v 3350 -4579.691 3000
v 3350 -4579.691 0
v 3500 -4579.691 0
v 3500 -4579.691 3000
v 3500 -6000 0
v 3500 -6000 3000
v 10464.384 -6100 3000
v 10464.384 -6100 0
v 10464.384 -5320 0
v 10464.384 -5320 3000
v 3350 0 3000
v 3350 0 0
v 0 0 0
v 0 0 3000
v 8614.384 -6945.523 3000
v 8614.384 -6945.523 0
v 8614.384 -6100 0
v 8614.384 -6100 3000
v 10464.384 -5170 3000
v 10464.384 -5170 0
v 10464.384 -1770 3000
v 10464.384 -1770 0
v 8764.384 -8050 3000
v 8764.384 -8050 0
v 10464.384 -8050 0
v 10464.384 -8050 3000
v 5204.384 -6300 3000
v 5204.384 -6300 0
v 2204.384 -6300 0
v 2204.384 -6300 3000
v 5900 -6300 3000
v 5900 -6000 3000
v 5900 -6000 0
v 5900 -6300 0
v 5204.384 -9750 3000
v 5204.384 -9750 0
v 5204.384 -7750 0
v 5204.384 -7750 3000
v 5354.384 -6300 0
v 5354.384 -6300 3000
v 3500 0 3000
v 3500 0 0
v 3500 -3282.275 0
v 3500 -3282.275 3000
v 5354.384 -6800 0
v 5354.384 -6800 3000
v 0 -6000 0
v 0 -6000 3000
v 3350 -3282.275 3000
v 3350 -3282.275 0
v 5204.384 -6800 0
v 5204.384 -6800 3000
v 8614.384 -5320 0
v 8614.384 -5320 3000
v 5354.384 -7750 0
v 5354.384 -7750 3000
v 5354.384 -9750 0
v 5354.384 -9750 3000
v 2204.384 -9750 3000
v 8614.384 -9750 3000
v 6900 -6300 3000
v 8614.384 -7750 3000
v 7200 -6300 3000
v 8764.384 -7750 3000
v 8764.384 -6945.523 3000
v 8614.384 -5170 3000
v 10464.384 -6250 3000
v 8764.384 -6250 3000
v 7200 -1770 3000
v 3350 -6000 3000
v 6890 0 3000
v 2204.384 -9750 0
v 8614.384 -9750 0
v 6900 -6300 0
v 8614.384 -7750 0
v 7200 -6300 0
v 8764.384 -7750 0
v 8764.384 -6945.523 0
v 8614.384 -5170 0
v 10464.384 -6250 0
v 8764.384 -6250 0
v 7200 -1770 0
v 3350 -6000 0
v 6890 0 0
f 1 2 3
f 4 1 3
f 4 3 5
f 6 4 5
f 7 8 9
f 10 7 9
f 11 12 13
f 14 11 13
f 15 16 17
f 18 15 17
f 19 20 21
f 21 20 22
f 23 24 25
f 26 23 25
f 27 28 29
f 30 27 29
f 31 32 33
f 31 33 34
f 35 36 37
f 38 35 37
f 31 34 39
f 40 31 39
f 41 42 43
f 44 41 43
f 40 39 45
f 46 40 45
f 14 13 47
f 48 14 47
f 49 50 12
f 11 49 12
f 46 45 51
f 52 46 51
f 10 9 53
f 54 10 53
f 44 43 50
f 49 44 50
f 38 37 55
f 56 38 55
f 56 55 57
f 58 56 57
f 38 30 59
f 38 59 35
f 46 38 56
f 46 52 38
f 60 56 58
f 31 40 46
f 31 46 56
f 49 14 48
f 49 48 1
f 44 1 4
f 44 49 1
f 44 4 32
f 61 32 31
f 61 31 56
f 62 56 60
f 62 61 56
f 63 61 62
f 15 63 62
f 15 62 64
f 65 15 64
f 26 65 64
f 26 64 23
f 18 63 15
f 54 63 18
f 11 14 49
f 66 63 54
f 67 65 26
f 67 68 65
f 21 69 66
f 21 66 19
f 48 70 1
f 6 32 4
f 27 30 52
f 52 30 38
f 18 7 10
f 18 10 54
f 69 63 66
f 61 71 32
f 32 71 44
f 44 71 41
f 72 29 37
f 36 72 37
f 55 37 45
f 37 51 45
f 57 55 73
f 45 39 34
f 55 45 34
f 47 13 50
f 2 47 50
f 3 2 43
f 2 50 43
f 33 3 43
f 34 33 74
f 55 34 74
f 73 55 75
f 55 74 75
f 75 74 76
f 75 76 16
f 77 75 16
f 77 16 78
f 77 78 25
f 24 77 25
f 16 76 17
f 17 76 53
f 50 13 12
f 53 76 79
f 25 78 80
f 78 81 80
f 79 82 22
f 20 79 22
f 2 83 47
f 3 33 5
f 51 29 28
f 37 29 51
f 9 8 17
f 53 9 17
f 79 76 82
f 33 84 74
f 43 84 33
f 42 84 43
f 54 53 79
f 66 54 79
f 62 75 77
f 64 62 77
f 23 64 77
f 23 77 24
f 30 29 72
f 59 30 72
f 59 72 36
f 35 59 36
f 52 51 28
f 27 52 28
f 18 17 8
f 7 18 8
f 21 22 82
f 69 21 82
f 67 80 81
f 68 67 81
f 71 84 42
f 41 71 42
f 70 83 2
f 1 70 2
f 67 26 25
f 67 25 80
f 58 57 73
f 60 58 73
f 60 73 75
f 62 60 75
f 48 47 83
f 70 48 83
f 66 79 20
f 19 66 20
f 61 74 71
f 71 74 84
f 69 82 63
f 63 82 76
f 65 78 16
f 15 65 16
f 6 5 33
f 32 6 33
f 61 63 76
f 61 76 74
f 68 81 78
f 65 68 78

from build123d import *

# Parameters (mm, degrees)
F1_DEPTH = 3000


with BuildPart() as f1:
    # F0 (on Top) → F1 (new body)
    with BuildSketch(Plane.XY):
        Polygon((3350, 0), (0, 0), (0, -6000), (3350, -6000), (3350, -4579.691163), (3500, -4579.691163), (3500, -6000), (5900, -6000), (5900, -6300), (5354.383537, -6300), (5354.383537, -6800), (5204.383537, -6800), (5204.383537, -6300), (2204.383537, -6300), (2204.383537, -9750), (5204.383537, -9750), (5204.383537, -7750), (5354.383537, -7750), (5354.383537, -9750), (8614.383537, -9750), (8614.383537, -7750), (8764.383537, -7750), (8764.383537, -8050), (10464.383537, -8050), (10464.383537, -6250), (8764.383537, -6250), (8764.383537, -6945.523262), (8614.383537, -6945.523262), (8614.383537, -6100), (8764.383537, -6100), (10464.383537, -6100), (10464.383537, -5320), (8614.383537, -5320), (8614.383537, -5170), (10464.383537, -5170), (10464.383537, -1770), (7200, -1770), (7200, -6300), (6900, -6300), (6890, 0), (3500, 0), (3500, -3282.274732), (3350, -3282.274732), align=None)
    extrude(amount=F1_DEPTH)


solid = f1.part
